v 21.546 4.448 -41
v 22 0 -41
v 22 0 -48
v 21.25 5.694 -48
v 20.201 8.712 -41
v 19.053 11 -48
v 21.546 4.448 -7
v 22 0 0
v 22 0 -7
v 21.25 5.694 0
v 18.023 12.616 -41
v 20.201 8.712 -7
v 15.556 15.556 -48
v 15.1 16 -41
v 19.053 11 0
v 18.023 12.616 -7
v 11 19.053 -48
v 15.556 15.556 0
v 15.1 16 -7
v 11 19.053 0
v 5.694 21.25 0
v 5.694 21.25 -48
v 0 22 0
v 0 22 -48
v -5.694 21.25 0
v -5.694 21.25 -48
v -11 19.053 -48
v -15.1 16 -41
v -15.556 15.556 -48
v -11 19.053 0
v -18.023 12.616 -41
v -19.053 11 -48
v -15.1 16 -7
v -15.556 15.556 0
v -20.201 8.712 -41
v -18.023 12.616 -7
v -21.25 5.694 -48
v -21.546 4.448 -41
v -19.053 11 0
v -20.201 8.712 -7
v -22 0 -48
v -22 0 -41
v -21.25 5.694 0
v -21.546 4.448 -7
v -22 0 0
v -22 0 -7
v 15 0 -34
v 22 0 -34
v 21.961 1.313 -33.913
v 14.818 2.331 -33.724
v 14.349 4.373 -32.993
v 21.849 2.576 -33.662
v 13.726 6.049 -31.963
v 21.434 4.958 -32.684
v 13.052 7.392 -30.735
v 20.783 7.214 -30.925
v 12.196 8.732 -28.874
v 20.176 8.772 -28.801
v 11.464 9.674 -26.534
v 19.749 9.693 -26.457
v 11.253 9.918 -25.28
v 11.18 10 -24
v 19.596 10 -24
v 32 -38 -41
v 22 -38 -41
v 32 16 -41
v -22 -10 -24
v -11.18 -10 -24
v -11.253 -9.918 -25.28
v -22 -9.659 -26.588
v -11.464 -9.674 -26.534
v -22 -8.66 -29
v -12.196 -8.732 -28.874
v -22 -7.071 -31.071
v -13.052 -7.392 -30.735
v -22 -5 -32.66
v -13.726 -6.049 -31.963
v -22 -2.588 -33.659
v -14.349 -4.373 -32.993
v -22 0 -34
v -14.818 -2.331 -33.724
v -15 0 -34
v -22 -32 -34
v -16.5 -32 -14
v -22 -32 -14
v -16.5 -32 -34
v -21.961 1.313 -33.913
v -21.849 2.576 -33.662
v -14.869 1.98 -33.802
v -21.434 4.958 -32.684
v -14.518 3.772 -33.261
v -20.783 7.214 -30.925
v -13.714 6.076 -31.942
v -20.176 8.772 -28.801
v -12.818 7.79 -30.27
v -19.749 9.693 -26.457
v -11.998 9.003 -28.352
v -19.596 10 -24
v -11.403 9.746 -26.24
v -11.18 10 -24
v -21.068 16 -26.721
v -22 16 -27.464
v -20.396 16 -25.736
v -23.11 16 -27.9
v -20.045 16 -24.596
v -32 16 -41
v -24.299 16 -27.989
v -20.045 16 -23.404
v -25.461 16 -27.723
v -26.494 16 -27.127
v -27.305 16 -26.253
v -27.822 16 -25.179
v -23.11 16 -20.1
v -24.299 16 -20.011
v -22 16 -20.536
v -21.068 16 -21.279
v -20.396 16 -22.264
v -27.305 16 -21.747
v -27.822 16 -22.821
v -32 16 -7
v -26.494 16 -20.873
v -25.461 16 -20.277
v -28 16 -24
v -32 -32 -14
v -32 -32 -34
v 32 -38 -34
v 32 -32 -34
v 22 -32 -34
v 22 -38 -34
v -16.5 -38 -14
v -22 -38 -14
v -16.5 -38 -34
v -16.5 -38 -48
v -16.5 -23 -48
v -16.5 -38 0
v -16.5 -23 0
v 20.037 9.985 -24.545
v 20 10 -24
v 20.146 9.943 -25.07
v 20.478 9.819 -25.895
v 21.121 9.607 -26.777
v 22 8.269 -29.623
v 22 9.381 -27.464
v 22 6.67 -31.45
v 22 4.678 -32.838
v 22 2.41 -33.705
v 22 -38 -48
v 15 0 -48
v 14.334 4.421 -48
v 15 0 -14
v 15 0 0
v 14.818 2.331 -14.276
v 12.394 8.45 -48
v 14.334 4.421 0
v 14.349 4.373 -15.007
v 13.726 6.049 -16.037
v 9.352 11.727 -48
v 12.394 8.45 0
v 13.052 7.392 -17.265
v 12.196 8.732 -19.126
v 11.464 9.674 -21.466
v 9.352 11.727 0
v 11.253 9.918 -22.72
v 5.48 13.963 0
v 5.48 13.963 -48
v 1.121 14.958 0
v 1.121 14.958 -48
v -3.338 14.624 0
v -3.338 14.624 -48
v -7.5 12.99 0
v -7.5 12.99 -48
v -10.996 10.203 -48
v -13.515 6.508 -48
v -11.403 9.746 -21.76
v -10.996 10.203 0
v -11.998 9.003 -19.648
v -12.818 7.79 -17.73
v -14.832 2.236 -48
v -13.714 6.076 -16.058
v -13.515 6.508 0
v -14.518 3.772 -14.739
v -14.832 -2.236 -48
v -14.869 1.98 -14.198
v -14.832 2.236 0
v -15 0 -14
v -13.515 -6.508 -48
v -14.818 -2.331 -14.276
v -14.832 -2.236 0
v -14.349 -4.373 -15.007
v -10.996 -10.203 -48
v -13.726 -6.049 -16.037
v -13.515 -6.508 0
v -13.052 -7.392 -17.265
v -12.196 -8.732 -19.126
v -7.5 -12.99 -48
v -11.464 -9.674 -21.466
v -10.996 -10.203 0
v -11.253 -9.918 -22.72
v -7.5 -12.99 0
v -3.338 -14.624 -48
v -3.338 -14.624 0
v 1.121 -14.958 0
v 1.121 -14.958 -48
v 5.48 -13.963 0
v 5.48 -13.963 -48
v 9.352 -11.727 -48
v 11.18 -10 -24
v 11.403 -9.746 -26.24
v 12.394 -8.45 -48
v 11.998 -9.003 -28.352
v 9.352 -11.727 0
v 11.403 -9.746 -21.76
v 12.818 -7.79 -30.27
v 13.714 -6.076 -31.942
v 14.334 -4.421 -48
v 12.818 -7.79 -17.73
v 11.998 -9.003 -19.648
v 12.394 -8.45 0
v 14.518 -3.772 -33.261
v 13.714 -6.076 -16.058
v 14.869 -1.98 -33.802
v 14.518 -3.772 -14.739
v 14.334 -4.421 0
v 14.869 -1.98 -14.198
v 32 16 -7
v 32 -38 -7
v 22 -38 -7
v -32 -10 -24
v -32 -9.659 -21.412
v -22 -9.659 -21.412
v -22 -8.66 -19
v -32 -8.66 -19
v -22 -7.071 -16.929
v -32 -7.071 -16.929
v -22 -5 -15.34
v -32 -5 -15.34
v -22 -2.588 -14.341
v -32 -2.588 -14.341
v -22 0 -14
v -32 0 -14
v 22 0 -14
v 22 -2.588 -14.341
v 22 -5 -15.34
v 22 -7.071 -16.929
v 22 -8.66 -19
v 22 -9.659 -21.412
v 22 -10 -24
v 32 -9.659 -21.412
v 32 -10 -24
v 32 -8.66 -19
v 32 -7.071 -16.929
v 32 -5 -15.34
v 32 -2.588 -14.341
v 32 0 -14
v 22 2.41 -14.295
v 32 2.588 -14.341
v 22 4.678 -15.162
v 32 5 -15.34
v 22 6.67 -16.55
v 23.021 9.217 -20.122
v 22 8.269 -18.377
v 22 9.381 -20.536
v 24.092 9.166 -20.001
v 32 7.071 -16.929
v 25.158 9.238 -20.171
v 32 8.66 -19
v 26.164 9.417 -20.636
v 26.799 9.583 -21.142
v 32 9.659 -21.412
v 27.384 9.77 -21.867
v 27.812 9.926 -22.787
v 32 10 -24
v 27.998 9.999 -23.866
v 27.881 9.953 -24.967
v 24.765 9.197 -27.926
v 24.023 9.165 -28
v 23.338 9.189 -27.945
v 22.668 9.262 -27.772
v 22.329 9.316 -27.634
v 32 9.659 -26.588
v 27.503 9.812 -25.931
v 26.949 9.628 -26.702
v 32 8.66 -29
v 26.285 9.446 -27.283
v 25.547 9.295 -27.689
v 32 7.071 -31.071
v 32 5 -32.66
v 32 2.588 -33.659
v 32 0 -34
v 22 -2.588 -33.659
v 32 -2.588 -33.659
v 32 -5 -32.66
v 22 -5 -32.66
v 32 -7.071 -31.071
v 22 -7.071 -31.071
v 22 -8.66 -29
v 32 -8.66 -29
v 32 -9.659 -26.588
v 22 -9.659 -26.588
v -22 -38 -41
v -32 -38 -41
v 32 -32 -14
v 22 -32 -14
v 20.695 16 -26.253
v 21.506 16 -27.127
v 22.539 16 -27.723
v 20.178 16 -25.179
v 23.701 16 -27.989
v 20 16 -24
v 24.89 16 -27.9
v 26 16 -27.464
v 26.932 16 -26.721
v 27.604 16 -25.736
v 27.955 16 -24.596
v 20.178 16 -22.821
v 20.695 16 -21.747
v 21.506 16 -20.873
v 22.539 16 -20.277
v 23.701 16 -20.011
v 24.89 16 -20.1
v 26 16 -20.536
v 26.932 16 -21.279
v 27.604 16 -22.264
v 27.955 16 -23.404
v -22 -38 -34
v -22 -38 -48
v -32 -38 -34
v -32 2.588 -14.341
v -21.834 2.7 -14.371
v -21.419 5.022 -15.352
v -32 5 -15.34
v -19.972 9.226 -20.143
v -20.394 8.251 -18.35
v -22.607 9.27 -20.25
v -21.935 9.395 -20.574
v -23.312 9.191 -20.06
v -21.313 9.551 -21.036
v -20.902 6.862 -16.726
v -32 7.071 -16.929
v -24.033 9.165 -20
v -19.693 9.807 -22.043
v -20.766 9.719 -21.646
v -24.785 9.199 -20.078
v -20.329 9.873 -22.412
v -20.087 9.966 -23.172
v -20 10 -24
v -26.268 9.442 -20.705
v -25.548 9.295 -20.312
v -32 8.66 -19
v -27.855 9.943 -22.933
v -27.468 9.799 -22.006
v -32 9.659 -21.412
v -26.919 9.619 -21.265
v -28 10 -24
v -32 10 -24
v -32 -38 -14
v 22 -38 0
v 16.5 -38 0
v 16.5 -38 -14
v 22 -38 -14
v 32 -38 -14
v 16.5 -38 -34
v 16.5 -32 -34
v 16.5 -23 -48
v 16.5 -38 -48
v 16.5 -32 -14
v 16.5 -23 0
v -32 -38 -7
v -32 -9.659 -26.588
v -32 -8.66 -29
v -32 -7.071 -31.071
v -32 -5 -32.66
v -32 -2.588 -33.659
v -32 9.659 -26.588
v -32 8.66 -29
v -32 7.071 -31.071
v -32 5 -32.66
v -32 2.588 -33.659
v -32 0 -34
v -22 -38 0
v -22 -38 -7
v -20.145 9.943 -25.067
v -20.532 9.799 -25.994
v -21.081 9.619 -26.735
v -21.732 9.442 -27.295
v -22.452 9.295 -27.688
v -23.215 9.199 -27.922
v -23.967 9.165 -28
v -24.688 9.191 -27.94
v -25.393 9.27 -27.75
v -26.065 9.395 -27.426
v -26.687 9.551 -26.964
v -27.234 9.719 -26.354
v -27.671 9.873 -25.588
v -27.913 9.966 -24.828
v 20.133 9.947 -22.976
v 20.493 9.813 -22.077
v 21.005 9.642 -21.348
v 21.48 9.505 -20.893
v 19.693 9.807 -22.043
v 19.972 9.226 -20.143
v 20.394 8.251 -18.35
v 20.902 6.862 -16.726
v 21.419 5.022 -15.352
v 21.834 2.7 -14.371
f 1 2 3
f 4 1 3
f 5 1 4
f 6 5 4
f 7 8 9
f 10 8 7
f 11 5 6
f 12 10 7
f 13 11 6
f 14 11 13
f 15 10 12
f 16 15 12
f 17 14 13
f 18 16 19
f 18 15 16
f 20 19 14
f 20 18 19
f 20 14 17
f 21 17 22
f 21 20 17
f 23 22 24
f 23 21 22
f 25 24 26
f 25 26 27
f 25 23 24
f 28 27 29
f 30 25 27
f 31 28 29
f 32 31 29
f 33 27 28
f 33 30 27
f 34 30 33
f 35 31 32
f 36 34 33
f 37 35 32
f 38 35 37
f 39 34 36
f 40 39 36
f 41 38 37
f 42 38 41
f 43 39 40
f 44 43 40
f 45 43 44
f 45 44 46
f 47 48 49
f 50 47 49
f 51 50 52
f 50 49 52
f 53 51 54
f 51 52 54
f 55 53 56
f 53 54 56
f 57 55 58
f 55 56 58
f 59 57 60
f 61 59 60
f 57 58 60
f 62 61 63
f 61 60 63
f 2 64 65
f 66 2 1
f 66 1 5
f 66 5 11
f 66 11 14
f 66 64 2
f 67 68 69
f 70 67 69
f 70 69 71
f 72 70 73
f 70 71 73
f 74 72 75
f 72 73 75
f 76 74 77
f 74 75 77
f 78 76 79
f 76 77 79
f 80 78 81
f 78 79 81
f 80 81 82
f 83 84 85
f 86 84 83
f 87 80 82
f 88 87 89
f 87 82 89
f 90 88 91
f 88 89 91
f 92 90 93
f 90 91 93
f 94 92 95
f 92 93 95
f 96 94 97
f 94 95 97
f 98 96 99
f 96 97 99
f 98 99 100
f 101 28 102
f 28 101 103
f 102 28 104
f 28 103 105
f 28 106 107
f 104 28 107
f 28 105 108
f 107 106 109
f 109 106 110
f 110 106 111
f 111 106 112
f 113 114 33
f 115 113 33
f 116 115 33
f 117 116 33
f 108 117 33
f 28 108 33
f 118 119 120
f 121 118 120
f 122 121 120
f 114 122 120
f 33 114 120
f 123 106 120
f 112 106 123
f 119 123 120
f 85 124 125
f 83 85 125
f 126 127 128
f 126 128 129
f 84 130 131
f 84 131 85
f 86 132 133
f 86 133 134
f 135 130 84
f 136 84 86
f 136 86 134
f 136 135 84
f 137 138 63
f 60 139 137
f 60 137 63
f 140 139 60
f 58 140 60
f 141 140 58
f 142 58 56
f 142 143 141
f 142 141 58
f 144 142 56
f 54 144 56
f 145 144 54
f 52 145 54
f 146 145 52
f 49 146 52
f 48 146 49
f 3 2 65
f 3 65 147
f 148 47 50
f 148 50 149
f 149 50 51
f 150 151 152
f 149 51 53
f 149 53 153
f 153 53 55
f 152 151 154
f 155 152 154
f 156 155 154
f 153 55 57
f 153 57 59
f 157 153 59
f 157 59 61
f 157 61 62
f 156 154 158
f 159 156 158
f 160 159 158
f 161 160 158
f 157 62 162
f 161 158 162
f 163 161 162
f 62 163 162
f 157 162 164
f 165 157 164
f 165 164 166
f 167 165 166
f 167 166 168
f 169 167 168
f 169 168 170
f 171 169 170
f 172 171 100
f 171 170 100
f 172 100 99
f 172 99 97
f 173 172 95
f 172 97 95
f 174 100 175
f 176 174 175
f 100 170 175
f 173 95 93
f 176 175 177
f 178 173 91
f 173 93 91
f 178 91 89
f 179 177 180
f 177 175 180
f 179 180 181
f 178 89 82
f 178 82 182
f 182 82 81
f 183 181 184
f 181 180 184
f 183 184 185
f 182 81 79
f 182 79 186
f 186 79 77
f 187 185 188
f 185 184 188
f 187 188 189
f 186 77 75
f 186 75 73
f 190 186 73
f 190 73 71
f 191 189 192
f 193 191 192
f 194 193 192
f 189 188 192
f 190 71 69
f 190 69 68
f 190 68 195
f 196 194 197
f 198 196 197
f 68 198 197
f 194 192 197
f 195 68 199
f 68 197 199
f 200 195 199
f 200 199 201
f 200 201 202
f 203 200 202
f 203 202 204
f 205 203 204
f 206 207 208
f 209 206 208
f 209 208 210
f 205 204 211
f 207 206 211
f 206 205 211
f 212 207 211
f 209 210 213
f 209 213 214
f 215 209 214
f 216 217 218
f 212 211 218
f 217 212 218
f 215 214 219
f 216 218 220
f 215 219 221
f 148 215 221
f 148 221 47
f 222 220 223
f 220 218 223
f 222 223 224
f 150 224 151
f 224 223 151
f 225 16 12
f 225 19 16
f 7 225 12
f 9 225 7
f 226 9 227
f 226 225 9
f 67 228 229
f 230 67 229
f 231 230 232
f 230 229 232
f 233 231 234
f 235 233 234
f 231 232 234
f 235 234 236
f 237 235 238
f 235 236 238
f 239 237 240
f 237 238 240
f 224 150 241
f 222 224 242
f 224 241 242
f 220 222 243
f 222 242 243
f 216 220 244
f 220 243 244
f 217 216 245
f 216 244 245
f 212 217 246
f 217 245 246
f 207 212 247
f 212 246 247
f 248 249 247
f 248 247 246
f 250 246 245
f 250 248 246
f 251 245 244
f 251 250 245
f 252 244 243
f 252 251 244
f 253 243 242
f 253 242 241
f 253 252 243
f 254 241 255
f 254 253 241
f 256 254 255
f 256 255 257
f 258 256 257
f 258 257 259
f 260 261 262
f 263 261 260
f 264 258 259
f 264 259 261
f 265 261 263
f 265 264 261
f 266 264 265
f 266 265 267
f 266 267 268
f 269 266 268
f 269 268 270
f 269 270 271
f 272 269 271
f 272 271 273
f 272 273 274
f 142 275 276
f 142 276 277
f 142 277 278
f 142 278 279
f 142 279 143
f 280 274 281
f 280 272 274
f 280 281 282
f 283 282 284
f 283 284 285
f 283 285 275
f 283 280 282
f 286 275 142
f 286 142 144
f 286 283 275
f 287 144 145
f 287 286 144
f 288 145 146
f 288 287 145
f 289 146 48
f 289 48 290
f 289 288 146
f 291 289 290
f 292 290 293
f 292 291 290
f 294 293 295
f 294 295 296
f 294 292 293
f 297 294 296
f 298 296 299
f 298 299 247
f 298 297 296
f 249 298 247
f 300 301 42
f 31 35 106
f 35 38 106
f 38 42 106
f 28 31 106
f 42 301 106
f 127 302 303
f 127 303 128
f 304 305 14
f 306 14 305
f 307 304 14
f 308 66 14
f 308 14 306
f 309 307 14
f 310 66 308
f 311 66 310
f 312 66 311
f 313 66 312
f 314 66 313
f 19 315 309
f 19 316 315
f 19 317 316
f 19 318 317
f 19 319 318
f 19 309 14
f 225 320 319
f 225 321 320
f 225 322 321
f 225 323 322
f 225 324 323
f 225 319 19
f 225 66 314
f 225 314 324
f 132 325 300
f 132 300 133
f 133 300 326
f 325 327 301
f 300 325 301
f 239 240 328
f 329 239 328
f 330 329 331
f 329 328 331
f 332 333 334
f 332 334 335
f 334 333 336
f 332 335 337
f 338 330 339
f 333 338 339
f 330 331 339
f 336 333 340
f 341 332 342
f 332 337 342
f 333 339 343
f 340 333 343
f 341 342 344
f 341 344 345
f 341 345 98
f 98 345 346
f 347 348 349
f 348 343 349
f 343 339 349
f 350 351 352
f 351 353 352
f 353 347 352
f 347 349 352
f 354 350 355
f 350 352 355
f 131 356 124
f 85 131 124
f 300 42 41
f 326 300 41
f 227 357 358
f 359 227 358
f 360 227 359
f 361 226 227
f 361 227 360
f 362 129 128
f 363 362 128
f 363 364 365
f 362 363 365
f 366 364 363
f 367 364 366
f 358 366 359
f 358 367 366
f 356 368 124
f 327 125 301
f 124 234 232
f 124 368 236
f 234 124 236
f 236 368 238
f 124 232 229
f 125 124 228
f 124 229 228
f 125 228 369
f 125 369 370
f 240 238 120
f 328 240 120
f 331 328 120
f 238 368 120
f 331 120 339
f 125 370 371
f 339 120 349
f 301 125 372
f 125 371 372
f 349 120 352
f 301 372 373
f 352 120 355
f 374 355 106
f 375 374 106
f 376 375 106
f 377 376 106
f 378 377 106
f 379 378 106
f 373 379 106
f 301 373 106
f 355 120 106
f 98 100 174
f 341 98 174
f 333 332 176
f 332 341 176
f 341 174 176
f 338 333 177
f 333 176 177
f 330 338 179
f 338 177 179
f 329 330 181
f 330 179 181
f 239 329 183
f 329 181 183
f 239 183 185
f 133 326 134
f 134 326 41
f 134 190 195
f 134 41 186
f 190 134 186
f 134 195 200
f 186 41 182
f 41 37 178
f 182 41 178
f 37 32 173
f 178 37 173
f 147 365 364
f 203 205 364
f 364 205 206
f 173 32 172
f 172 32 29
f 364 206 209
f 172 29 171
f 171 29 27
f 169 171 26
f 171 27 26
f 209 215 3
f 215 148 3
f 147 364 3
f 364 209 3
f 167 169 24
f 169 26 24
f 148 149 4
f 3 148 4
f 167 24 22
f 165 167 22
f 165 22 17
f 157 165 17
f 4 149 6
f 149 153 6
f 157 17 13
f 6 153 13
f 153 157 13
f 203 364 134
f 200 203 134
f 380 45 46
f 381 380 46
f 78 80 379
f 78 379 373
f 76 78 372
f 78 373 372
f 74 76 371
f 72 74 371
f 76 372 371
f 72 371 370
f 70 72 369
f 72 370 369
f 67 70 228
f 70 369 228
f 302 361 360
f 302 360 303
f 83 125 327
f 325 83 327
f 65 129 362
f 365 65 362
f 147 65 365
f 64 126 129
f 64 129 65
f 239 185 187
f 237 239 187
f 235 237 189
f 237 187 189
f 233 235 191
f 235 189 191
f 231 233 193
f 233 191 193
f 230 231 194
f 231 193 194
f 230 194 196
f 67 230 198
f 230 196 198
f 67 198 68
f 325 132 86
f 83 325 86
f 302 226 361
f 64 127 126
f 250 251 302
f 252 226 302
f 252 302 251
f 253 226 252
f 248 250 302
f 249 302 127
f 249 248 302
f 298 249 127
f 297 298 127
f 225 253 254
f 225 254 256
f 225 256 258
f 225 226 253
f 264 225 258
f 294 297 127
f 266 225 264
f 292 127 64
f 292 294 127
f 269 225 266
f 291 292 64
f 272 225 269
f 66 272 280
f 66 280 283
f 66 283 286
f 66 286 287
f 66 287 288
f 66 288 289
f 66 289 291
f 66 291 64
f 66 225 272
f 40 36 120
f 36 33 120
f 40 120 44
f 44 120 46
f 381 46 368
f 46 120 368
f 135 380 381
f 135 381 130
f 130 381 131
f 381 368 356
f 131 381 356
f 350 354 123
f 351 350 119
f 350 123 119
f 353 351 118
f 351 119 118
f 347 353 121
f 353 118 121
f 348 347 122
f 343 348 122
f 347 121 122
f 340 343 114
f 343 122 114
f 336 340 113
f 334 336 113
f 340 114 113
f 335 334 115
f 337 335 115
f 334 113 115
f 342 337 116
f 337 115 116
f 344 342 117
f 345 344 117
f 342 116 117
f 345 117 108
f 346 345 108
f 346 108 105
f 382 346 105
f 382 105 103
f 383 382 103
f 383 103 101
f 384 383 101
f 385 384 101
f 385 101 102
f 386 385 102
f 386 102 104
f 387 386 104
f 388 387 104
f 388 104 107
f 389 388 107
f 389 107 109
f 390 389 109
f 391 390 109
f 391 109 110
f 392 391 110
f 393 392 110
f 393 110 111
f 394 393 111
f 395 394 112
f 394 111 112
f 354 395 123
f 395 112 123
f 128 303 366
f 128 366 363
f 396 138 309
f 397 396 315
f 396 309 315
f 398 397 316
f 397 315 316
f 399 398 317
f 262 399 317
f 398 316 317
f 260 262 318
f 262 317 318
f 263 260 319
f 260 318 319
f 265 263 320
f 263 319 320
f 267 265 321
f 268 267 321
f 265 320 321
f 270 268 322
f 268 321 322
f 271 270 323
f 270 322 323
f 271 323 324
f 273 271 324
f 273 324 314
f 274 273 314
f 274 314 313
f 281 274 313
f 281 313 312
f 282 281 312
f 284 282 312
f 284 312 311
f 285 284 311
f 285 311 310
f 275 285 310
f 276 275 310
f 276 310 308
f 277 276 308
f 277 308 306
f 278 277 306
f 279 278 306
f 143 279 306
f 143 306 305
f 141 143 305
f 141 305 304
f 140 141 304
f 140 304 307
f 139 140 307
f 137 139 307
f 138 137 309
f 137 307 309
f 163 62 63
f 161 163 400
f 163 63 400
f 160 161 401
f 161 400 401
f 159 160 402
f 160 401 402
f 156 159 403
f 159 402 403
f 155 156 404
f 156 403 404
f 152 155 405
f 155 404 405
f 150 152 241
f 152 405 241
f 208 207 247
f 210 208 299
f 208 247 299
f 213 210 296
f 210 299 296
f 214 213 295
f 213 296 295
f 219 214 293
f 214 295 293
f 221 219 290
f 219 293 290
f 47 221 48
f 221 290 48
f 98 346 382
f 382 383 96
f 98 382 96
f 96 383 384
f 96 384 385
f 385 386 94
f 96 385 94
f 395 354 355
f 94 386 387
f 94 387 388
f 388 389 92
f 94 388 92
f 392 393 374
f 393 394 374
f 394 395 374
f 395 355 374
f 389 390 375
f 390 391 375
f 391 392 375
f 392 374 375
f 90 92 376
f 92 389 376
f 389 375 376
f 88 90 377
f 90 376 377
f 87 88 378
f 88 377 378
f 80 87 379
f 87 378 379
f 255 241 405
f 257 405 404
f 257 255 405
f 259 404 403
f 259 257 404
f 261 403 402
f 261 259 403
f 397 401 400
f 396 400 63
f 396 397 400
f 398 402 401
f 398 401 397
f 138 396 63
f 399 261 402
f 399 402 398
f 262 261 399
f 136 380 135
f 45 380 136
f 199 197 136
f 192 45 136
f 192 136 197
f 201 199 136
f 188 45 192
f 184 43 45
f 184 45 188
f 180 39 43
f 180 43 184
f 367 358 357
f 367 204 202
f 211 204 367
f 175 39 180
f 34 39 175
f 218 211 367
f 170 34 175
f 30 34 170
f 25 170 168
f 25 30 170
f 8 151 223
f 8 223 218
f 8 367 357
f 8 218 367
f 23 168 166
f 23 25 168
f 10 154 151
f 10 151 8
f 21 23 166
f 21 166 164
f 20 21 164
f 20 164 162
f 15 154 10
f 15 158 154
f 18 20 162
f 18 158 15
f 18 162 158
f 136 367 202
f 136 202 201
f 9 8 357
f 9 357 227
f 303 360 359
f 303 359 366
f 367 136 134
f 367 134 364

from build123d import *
from build123d.topology import SkipClean

# Parameters (mm, degrees)
SKETCH1_R           = 15
BOSS_EXTRUDE1_DEPTH = 48
BOSS_EXTRUDE3_DEPTH = 6.9
BOSS_EXTRUDE4_START = 10
BOSS_EXTRUDE4_DEPTH = 10
SKETCH2_5_W         = 20
SKETCH2_5_H         = 6
CUT_EXTRUDE1_DEPTH  = 82.633326528
SKETCH3_R           = 4
CUT_EXTRUDE2_DEPTH  = 10


with BuildPart() as part:
    # Sketch1 → Boss-Extrude1 (new body)
    with BuildSketch(Plane.XY):
        with BuildLine():
            Line((-22, 0), (-22, -37.999983616))
            Line((-22, -37.999983616), (-16.5, -37.999983616))
            Line((-16.5, -37.999983616), (-16.5, -23))
            Line((-16.5, -23), (16.5, -23))
            Line((16.5, -23), (16.5, -38))
            Line((16.5, -38), (22, -38))
            Line((22, -38), (22, 0))
            ThreePointArc((22, 0), (0, 22), (-22, 0))
        make_face()
        Circle(SKETCH1_R, mode=Mode.SUBTRACT)
    boss_extrude1 = extrude(amount=-BOSS_EXTRUDE1_DEPTH)

    # Sketch2 → Boss-Extrude3 (add)
    with BuildSketch(Plane(origin=(22, 0, 0), x_dir=(0, 0, -1), z_dir=(1, 0, 0))):
        with BuildLine():
            Line((7, 16), (7, 0))
            Line((7, 0), (14, 0))
            ThreePointArc((14, 0), (16.928932188, 7.071067812), (24, 10))
            Line((24, 10), (24, 16))
            Line((24, 16), (7, 16))
        make_face()
        with BuildLine():
            Line((41, 16), (24, 16))
            Line((24, 16), (24, 10))
            ThreePointArc((24, 10), (31.071067812, 7.071067812), (34, 0))
            Line((34, 0), (41, 0))
            Line((41, 0), (41, 16))
        make_face()
    boss_extrude3 = extrude(amount=-BOSS_EXTRUDE3_DEPTH)

    # Sketch2<4> → Boss-Extrude4 (add)
    with BuildSketch(Plane(origin=(22, 0, 0), x_dir=(0, 0, -1), z_dir=(1, 0, 0)).offset(BOSS_EXTRUDE4_START)):
        with BuildLine():
            Line((41, 16), (24, 16))
            Line((24, 16), (24, 10))
            ThreePointArc((24, 10), (31.071067812, 7.071067812), (34, 0))
            Line((34, 0), (41, 0))
            Line((41, 0), (41, 16))
        make_face()
        with BuildLine():
            Line((7, 16), (7, 0))
            Line((7, 0), (14, 0))
            ThreePointArc((14, 0), (16.928932188, 7.071067812), (24, 10))
            Line((24, 10), (24, 16))
            Line((24, 16), (7, 16))
        make_face()
        with BuildLine():
            Line((7, 0), (7, -38))
            Line((7, -38), (14, -38))
            Line((14, -38), (14, -32))
            Line((14, -32), (24, -32))
            Line((24, -32), (24, -10))
            ThreePointArc((24, -10), (16.928932188, -7.071067812), (14, 0))
            Line((14, 0), (7, 0))
        make_face()
        with BuildLine():
            Line((34, -32), (34, -38))
            Line((34, -38), (41, -38))
            Line((41, -38), (41, 0))
            Line((41, 0), (34, 0))
            ThreePointArc((34, 0), (31.071067812, -7.071067812), (24, -10))
            Line((24, -10), (24, -32))
            Line((24, -32), (34, -32))
        make_face()
    boss_extrude4 = extrude(amount=-BOSS_EXTRUDE4_DEPTH)

    # Mirror2: Boss-Extrude1, Boss-Extrude3, Boss-Extrude4 across plane
    add(boss_extrude1.mirror(Plane.ZY))
    add(boss_extrude3.mirror(Plane.ZY))
    add(boss_extrude4.mirror(Plane.ZY))

    # Sketch2<5> → Cut-Extrude1 (cut, through all)
    with SkipClean():  # the faces are left unmerged after this step: merging them gives an invalid solid
        with BuildSketch(Plane(origin=(22, 0, 0), x_dir=(0, 0, -1), z_dir=(1, 0, 0))):
            with BuildLine():
                Line((24, 0), (14, 0))
                ThreePointArc((14, 0), (16.928932188, -7.071067812), (24, -10))
                Line((24, -10), (24, 0))
            make_face()
            with BuildLine():
                ThreePointArc((24, 10), (16.928932188, 7.071067812), (14, 0))
                Line((14, 0), (24, 0))
                Line((24, 0), (24, 10))
            make_face()
            with BuildLine():
                ThreePointArc((34, 0), (31.071067812, 7.071067812), (24, 10))
                Line((24, 10), (24, 0))
                Line((24, 0), (34, 0))
            make_face()
            with BuildLine():
                Line((24, 0), (24, -10))
                ThreePointArc((24, -10), (31.071067812, -7.071067812), (34, 0))
                Line((34, 0), (24, 0))
            make_face()
            with Locations((24, -35)):
                Rectangle(SKETCH2_5_W, SKETCH2_5_H)
        extrude(amount=-CUT_EXTRUDE1_DEPTH, mode=Mode.SUBTRACT)

    # Sketch3 → Cut-Extrude2 (cut)
    with SkipClean():  # the faces are left unmerged after this step: merging them gives an invalid solid
        with BuildSketch(Plane(origin=(0, 16, 0), x_dir=(1, 0, 0), z_dir=(0, 1, 0))):
            with Locations(Location((24, 24, 0), (0, 0, 180))):
                Circle(SKETCH3_R)
            with Locations(Location((-24, 24, 0), (0, 0, 180))):
                Circle(SKETCH3_R)
        extrude(amount=-CUT_EXTRUDE2_DEPTH, mode=Mode.SUBTRACT)


solid = part.part
